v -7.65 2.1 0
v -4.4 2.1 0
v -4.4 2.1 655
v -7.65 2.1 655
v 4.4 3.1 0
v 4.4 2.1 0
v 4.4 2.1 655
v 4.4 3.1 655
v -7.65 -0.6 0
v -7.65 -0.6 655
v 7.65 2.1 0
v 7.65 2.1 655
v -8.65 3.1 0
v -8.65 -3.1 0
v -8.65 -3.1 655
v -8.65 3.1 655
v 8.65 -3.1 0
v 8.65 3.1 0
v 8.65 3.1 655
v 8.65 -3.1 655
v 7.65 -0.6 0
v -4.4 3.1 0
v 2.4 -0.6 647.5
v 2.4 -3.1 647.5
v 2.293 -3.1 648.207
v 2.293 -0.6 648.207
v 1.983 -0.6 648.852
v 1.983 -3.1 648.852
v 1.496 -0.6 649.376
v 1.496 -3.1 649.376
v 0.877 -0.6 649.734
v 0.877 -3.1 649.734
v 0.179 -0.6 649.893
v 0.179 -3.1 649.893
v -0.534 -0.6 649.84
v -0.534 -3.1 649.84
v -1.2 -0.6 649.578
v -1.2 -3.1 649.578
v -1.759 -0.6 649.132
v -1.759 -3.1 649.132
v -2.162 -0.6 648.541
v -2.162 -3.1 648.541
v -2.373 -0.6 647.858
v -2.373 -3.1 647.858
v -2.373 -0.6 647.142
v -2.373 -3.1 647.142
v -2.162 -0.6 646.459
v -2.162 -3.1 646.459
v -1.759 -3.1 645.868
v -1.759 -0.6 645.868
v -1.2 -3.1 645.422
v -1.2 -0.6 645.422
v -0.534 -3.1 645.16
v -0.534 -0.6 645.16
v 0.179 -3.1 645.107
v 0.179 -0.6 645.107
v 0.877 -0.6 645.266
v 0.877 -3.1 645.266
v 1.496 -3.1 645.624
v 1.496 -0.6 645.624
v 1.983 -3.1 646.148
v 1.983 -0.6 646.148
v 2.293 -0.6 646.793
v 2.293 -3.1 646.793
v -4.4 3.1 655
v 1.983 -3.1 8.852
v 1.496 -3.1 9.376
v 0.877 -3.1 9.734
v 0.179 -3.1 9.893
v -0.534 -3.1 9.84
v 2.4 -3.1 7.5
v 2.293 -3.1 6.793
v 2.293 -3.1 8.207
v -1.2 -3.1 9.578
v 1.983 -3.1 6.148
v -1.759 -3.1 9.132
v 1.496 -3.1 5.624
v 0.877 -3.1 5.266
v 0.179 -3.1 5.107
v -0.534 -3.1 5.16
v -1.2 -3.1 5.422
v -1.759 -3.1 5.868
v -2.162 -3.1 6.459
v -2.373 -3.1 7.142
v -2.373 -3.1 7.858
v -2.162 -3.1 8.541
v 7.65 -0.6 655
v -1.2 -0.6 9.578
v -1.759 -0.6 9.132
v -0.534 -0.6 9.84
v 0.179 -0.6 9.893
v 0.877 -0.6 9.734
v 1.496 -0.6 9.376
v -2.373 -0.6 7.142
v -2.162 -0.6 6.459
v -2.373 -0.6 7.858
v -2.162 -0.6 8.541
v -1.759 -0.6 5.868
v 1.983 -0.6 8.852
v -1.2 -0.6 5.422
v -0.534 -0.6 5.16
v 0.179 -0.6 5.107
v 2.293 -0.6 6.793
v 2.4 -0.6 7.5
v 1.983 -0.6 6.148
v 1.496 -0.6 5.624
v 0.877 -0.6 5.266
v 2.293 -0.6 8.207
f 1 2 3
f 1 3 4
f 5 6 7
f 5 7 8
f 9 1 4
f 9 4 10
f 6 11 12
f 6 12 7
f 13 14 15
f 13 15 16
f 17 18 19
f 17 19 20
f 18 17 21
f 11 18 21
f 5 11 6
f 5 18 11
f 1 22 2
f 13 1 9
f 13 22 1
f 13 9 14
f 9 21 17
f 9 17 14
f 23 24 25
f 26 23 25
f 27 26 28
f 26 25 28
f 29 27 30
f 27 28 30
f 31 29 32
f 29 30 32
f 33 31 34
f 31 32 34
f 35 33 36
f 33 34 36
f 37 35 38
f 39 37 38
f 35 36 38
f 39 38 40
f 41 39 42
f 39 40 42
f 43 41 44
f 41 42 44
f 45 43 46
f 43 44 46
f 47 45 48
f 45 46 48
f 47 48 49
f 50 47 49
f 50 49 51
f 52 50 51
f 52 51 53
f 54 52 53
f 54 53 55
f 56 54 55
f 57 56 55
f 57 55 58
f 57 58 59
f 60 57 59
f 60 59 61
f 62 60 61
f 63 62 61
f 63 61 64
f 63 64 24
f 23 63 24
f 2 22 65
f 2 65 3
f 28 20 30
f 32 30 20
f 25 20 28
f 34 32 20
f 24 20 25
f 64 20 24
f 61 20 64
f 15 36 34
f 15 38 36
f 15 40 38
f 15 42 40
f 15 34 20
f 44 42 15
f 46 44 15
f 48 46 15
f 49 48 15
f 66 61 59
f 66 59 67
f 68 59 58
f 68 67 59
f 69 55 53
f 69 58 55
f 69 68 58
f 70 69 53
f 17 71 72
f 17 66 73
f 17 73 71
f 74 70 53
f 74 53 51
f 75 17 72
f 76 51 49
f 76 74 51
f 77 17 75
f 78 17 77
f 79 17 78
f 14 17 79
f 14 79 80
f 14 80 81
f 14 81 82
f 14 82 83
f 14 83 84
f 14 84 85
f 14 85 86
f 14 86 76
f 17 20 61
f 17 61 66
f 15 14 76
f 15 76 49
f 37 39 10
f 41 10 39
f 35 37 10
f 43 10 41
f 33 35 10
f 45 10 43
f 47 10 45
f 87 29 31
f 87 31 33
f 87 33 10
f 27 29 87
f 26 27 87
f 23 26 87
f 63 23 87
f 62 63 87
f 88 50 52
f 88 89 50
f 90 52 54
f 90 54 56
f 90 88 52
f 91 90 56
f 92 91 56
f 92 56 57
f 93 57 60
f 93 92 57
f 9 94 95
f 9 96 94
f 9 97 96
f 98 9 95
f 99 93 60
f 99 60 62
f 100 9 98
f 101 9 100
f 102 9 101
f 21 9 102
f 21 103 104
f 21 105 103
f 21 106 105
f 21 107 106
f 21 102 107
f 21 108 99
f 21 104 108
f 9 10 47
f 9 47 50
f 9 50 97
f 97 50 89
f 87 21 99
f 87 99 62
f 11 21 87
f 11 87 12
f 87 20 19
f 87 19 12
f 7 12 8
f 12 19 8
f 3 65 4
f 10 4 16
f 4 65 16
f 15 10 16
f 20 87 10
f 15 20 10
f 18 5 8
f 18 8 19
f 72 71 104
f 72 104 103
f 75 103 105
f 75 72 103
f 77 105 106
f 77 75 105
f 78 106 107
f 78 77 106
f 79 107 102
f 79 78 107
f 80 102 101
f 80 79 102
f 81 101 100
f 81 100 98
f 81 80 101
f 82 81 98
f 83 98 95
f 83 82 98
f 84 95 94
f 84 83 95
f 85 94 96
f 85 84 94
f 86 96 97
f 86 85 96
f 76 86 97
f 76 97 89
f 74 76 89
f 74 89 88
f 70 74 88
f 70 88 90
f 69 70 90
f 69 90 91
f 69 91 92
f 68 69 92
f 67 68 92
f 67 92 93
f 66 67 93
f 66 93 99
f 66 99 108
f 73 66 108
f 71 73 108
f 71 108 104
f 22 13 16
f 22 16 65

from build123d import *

# Parameters (mm, degrees)
EXTRUDE_1_DEPTH     = 655
CUT_EXTRUDE_1_REACH = 657.086
SKETCH_2_R          = 2.4


with BuildPart() as part:
    # ｽｹｯﾁ1 → ﾎﾞｽ - 押し出し1 (new body)
    with BuildSketch(Plane.XY):
        Polygon((-4.4, 3.1), (-4.4, 2.1), (-7.65, 2.1), (-7.65, -0.6), (7.65, -0.6), (7.65, 2.1), (4.4, 2.1), (4.4, 3.1), (8.65, 3.1), (8.65, -3.1), (-8.65, -3.1), (-8.65, 3.1), align=None)
    extrude(amount=EXTRUDE_1_DEPTH)

    # ｽｹｯﾁ2 → ｶｯﾄ - 押し出し1 (cut, up to next)
    with BuildSketch(Plane(origin=(0, -3.1, 0), x_dir=(-1, 0, 0), z_dir=(0, -1, 0)), mode=Mode.PRIVATE) as cut_extrude_1_sk1:
        with Locations(Location((0, -647.5, 0), (0, 0, 180))):
            Circle(SKETCH_2_R)
    cut_extrude_1_tool1 = extrude(cut_extrude_1_sk1.sketch, amount=-CUT_EXTRUDE_1_REACH, mode=Mode.PRIVATE) & part.part
    cut_extrude_1 = cut_extrude_1_tool1.solids().sort_by_distance((0, -3.1, 647.5))[0]
    add(cut_extrude_1, mode=Mode.SUBTRACT)

    # ﾐﾗｰ1: ｶｯﾄ - 押し出し1 across plane
    add(cut_extrude_1.mirror(Plane.XY.offset(327.5)), mode=Mode.SUBTRACT)


solid = part.part
